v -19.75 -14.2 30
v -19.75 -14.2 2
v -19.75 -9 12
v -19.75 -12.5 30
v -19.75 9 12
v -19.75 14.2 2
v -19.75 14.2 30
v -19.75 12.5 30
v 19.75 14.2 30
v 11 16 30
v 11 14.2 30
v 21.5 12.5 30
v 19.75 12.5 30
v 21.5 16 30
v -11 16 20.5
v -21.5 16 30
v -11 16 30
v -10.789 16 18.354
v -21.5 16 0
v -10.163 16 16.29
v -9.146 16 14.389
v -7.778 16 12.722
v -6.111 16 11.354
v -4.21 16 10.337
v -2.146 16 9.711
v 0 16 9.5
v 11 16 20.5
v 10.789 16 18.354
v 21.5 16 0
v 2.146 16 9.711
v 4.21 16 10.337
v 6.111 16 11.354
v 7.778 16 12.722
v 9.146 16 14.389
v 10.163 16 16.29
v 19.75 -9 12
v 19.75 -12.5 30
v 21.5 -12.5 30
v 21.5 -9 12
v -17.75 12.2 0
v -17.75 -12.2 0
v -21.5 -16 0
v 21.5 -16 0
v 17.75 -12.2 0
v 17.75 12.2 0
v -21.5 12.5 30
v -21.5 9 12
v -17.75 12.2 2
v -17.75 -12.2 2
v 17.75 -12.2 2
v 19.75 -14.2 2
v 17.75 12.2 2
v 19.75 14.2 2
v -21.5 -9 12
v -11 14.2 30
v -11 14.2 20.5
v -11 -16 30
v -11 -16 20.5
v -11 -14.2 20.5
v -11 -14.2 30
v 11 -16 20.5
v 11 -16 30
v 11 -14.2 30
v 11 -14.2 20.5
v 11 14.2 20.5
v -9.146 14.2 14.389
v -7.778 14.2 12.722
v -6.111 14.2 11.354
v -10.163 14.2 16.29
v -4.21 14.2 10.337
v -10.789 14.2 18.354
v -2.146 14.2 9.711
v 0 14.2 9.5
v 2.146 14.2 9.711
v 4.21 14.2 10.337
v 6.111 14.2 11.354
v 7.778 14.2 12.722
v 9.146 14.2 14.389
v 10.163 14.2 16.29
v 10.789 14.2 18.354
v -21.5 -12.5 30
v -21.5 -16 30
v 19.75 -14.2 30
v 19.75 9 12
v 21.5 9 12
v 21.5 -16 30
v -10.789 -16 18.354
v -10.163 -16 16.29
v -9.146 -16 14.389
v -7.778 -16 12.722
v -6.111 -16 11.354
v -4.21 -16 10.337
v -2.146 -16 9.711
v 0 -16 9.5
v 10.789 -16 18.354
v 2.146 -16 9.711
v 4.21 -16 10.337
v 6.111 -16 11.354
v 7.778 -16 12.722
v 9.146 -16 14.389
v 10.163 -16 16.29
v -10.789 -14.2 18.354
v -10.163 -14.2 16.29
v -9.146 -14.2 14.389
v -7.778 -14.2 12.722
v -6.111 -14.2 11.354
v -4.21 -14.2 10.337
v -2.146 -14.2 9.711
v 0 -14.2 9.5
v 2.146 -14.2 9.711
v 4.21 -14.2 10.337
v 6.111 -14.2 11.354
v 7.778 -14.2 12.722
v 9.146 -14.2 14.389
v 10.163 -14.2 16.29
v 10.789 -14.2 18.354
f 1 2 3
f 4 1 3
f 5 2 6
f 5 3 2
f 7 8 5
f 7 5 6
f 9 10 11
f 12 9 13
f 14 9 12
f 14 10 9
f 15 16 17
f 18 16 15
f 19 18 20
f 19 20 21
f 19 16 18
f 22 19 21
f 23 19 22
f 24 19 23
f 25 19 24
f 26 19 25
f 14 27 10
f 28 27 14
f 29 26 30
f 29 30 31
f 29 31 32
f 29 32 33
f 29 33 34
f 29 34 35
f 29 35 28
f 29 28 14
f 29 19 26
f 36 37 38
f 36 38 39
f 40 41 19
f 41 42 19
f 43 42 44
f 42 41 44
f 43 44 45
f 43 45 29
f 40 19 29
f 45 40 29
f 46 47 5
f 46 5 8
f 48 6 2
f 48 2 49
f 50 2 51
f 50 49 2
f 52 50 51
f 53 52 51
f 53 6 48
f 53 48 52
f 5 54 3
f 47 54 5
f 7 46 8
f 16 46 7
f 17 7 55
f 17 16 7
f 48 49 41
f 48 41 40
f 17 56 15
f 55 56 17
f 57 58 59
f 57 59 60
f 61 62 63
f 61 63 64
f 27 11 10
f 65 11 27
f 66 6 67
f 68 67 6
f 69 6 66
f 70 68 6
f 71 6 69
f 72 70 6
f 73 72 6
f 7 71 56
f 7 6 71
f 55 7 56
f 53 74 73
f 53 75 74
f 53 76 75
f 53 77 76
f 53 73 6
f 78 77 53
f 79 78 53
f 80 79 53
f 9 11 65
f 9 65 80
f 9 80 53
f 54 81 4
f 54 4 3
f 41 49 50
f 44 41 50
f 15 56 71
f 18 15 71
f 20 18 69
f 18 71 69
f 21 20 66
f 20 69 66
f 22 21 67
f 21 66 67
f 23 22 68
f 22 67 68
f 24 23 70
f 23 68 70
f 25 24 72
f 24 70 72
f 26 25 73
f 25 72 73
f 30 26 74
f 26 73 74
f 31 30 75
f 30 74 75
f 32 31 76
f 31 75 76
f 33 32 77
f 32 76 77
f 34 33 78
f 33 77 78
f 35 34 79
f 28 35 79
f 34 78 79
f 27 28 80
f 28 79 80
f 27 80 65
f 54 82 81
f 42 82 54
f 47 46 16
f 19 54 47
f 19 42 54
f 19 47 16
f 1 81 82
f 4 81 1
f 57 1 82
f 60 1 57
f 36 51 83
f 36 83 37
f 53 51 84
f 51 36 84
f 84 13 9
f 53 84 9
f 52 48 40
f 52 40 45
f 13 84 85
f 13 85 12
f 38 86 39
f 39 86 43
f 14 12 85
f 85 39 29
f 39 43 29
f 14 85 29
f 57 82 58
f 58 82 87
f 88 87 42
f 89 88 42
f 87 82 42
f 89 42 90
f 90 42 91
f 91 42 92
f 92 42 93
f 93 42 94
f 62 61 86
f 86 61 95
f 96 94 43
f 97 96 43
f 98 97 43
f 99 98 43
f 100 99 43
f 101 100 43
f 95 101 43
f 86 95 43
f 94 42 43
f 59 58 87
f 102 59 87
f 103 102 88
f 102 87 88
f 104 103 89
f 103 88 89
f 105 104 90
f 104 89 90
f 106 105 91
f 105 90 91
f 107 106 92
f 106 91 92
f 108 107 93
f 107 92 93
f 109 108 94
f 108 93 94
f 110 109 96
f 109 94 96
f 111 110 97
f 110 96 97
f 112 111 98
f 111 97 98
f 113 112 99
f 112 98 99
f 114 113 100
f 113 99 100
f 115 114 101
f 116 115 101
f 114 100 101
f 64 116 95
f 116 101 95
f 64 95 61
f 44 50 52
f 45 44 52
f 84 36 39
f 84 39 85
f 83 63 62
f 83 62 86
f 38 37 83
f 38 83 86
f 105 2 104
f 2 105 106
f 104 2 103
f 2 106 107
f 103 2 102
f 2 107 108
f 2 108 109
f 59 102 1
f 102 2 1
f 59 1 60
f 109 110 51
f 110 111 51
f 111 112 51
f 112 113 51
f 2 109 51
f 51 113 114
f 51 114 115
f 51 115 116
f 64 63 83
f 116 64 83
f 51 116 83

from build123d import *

# Parameters (mm, degrees)
SKETCH_W        = 43
SKETCH_H        = 32
PAD_DEPTH       = 30
SKETCH001_W     = 39.5
SKETCH001_H     = 28.4
POCKET_DEPTH    = 28
POCKET001_DEPTH = 32.001
SKETCH003_W     = 35.5
SKETCH003_H     = 24.4
POCKET002_DEPTH = 2.001
POCKET003_DEPTH = 43.001


with BuildPart() as part:
    # Sketch → Pad (new body)
    with BuildSketch(Plane.XY):
        Rectangle(SKETCH_W, SKETCH_H)
    extrude(amount=PAD_DEPTH)

    # Sketch001 → Pocket (cut)
    with BuildSketch(Plane.XY.offset(30)):
        Rectangle(SKETCH001_W, SKETCH001_H)
    extrude(amount=-POCKET_DEPTH, mode=Mode.SUBTRACT)

    # Sketch002 → Pocket001 (cut, through all)
    with BuildSketch(Plane.XZ.offset(16)):
        with BuildLine():
            Line((-11, 30), (11, 30))
            Line((11, 30), (11, 20.499955))
            ThreePointArc((-11, 20.499955), (0, 9.5), (11, 20.499955))
            Line((-11, 20.499955), (-11, 30))
        make_face()
    extrude(amount=-POCKET001_DEPTH, mode=Mode.SUBTRACT)

    # Sketch003 → Pocket002 (cut, through all)
    with BuildSketch(Plane.XY.offset(2)):
        Rectangle(SKETCH003_W, SKETCH003_H)
    extrude(amount=-POCKET002_DEPTH, mode=Mode.SUBTRACT)

    # Sketch004 → Pocket003 (cut, through all)
    with BuildSketch(Plane(origin=(-21.5, 0, 0), x_dir=(0, -1, 0), z_dir=(-1, 0, 0))):
        Polygon((-12.5, 30), (12.5, 30), (9, 12), (-9, 12), align=None)
    extrude(amount=-POCKET003_DEPTH, mode=Mode.SUBTRACT)


solid = part.part
